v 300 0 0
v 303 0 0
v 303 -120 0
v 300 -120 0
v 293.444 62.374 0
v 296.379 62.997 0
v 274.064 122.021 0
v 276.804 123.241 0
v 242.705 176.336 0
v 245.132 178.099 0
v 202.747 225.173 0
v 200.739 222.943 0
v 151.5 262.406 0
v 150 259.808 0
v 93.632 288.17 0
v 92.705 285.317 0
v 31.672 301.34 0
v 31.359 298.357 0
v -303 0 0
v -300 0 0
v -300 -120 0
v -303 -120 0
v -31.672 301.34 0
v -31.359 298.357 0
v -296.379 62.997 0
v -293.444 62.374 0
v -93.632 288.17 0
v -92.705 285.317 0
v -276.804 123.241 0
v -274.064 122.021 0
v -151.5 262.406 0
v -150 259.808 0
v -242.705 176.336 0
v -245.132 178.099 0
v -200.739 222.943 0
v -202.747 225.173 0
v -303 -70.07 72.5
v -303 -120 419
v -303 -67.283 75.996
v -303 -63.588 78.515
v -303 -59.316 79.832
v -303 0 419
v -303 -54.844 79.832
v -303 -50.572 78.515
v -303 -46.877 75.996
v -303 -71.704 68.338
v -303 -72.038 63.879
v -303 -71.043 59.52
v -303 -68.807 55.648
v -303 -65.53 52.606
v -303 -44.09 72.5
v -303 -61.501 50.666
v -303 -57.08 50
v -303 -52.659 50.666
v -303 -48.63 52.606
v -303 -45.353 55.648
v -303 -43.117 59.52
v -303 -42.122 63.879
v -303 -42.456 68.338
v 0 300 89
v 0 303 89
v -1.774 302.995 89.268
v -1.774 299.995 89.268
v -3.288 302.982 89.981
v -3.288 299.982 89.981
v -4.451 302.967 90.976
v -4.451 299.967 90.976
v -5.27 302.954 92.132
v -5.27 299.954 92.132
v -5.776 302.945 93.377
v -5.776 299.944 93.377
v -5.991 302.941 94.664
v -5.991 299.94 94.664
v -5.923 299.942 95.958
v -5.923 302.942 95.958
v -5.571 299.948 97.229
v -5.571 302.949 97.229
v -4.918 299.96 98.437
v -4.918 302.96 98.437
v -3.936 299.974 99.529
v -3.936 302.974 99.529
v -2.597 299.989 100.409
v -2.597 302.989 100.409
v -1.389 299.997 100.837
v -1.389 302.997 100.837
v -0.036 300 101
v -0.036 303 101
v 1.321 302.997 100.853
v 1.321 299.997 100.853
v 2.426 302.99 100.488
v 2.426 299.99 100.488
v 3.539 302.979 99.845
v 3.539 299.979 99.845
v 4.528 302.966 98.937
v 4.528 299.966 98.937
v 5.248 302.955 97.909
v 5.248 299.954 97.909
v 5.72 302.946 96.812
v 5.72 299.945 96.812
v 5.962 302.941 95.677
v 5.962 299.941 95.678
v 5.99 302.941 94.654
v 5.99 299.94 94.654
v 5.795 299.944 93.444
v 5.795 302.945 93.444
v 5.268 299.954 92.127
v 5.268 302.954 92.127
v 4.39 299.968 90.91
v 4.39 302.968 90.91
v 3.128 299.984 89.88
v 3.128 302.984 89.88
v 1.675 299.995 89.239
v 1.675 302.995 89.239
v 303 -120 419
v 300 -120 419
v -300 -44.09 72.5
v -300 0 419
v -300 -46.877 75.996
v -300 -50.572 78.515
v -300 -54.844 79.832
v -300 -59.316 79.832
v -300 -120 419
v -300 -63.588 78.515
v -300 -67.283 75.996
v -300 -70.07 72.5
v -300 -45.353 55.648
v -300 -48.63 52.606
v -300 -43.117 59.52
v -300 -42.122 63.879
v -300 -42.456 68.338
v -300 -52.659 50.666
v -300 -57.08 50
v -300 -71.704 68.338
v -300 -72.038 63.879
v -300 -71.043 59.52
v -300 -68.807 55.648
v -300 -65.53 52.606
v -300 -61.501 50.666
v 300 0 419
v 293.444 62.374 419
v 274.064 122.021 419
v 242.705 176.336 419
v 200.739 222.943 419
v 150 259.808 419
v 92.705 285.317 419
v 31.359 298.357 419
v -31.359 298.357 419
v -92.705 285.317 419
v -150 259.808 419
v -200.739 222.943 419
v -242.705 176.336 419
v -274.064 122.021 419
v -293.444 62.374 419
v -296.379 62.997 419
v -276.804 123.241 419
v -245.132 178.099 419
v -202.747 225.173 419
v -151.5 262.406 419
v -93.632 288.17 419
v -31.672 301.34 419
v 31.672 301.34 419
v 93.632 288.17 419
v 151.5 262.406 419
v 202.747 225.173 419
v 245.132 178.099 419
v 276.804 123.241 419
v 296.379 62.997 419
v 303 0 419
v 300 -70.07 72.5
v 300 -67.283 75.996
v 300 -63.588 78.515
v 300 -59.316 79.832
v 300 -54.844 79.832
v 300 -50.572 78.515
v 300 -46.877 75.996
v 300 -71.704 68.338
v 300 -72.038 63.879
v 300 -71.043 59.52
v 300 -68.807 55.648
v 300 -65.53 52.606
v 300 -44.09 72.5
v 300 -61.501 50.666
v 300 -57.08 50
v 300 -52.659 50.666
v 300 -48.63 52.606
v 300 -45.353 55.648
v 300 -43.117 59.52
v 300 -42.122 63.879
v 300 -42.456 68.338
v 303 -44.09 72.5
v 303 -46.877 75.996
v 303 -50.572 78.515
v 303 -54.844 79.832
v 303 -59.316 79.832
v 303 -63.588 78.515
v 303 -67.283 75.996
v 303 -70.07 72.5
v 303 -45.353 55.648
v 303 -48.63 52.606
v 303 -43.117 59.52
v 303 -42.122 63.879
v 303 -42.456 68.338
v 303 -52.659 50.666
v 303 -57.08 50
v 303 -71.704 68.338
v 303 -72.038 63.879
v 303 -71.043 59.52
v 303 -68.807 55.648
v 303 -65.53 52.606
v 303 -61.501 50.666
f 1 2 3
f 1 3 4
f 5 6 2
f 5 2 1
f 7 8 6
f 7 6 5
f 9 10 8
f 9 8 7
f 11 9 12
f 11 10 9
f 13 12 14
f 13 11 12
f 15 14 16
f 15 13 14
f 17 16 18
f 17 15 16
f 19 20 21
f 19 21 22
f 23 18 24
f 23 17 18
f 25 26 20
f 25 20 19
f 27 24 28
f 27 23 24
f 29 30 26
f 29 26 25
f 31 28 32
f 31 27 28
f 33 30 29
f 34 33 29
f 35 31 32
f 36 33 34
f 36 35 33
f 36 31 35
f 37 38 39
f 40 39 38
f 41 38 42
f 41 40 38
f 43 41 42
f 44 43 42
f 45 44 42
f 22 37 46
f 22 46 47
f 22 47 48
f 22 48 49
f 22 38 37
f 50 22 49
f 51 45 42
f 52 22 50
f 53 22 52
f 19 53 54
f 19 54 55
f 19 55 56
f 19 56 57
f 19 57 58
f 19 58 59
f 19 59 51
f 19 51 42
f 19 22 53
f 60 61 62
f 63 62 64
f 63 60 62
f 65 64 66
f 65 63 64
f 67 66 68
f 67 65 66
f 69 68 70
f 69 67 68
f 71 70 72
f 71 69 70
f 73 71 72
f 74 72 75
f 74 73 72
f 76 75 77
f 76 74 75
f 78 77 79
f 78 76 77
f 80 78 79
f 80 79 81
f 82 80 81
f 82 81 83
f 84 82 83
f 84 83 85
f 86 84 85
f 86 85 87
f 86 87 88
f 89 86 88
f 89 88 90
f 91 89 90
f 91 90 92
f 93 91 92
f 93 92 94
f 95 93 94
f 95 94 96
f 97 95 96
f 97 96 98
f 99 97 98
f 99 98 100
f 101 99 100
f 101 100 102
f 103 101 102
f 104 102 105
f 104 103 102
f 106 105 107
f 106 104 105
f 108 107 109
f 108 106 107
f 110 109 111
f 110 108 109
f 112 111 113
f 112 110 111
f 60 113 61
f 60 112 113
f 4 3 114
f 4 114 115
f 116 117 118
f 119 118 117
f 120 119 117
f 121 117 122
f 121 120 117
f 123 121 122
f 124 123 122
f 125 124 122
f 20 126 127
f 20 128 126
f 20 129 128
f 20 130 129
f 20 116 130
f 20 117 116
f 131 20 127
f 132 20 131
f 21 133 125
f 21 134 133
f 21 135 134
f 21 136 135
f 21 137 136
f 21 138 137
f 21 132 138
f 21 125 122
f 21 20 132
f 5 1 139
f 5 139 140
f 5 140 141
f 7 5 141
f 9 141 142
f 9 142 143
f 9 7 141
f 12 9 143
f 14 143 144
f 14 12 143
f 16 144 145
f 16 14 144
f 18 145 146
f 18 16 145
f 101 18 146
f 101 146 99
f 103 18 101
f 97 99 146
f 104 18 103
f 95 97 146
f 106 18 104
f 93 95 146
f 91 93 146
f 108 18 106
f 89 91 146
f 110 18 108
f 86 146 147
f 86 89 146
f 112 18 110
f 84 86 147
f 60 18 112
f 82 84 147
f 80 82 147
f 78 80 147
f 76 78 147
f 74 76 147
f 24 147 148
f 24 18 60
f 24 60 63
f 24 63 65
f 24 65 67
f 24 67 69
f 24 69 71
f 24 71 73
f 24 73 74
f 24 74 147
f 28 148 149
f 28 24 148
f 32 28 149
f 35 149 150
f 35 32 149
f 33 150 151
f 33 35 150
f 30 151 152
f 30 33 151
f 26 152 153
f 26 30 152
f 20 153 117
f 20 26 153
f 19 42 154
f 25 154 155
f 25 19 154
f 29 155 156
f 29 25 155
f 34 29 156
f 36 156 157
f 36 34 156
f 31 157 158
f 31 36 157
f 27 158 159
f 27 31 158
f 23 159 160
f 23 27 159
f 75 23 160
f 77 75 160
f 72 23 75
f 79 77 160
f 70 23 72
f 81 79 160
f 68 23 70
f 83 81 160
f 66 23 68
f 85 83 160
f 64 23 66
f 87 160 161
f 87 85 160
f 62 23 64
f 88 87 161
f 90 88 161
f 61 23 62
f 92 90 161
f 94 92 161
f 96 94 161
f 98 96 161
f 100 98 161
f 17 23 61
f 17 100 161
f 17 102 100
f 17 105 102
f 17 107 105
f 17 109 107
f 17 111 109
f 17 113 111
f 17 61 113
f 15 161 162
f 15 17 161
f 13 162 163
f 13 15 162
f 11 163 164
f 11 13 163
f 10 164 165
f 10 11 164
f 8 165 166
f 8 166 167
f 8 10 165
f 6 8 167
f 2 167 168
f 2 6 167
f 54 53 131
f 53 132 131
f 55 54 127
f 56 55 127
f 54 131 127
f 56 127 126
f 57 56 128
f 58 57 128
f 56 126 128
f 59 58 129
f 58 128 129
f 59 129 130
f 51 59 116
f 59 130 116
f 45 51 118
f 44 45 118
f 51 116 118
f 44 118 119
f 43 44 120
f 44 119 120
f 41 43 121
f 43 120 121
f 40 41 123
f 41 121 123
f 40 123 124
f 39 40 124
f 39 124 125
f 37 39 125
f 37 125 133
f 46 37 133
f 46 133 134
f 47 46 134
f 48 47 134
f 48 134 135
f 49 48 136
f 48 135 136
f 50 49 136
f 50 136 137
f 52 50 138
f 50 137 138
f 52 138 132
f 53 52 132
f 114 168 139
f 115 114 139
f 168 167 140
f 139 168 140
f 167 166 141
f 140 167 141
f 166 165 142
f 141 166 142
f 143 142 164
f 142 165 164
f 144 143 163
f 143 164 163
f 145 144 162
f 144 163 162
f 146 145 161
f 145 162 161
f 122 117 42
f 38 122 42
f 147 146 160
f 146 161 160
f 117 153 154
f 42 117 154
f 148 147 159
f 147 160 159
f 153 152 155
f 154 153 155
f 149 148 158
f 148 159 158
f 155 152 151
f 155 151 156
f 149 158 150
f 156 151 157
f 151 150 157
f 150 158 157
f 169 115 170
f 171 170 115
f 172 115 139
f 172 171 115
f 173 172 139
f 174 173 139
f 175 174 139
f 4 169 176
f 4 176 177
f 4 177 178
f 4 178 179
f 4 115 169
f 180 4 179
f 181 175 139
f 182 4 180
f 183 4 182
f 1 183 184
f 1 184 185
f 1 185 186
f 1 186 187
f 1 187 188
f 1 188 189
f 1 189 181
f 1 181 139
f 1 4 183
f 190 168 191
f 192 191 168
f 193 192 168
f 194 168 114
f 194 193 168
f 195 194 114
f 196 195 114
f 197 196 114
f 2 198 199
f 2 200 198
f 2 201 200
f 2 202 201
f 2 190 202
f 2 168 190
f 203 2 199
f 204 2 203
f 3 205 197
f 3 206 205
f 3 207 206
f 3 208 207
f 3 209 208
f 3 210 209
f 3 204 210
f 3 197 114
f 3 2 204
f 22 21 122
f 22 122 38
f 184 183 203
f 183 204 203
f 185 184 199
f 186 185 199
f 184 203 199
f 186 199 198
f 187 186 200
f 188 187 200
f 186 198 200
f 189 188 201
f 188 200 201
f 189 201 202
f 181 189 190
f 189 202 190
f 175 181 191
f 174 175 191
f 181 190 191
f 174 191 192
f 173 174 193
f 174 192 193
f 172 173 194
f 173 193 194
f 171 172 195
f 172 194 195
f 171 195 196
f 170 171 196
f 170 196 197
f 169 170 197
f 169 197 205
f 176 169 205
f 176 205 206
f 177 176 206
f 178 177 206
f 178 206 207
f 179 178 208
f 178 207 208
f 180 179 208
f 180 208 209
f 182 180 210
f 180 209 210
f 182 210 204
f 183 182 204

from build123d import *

# Parameters (mm, degrees)
EXTRUDE_2_DEPTH     = 419
SKETCH_2_R          = 6
CUT_EXTRUDE_1_DEPTH = 490
SKETCH_3_R          = 15
CUT_EXTRUDE_2_DEPTH = 500


with BuildPart() as part:
    # 草图1 → 凸台-拉伸2 (new body)
    with BuildSketch(Plane.XY):
        with BuildLine():
            Line((-300, 0), (-300, -120))
            Line((-300, -120), (-303, -120))
            Line((-303, -120), (-303, 0))
            ThreePointArc((-303, 0), (0, 303), (303, 0))
            Line((303, 0), (303, -120))
            Line((303, -120), (300, -120))
            Line((300, -120), (300, 0))
            ThreePointArc((300, 0), (0, 300), (-300, 0))
        make_face()
    extrude(amount=EXTRUDE_2_DEPTH)

    # 草图2 → 切除-拉伸1 (cut)
    with BuildSketch(Plane(origin=(0, 0, 0), x_dir=(1, 0, 0), z_dir=(0, 1, 0))):
        with Locations(Location((0, -95, 0), (0, 0, 90))):
            Circle(SKETCH_2_R)
    extrude(amount=CUT_EXTRUDE_1_DEPTH, mode=Mode.SUBTRACT)

    # 草图3 → 切除-拉伸2 (cut, symmetric)
    with BuildSketch(Plane(origin=(0, 0, 0), x_dir=(0, 0, -1), z_dir=(1, 0, 0))):
        with Locations((-65, -57.08)):
            Circle(SKETCH_3_R)
    extrude(amount=CUT_EXTRUDE_2_DEPTH, both=True, mode=Mode.SUBTRACT)


solid = part.part
